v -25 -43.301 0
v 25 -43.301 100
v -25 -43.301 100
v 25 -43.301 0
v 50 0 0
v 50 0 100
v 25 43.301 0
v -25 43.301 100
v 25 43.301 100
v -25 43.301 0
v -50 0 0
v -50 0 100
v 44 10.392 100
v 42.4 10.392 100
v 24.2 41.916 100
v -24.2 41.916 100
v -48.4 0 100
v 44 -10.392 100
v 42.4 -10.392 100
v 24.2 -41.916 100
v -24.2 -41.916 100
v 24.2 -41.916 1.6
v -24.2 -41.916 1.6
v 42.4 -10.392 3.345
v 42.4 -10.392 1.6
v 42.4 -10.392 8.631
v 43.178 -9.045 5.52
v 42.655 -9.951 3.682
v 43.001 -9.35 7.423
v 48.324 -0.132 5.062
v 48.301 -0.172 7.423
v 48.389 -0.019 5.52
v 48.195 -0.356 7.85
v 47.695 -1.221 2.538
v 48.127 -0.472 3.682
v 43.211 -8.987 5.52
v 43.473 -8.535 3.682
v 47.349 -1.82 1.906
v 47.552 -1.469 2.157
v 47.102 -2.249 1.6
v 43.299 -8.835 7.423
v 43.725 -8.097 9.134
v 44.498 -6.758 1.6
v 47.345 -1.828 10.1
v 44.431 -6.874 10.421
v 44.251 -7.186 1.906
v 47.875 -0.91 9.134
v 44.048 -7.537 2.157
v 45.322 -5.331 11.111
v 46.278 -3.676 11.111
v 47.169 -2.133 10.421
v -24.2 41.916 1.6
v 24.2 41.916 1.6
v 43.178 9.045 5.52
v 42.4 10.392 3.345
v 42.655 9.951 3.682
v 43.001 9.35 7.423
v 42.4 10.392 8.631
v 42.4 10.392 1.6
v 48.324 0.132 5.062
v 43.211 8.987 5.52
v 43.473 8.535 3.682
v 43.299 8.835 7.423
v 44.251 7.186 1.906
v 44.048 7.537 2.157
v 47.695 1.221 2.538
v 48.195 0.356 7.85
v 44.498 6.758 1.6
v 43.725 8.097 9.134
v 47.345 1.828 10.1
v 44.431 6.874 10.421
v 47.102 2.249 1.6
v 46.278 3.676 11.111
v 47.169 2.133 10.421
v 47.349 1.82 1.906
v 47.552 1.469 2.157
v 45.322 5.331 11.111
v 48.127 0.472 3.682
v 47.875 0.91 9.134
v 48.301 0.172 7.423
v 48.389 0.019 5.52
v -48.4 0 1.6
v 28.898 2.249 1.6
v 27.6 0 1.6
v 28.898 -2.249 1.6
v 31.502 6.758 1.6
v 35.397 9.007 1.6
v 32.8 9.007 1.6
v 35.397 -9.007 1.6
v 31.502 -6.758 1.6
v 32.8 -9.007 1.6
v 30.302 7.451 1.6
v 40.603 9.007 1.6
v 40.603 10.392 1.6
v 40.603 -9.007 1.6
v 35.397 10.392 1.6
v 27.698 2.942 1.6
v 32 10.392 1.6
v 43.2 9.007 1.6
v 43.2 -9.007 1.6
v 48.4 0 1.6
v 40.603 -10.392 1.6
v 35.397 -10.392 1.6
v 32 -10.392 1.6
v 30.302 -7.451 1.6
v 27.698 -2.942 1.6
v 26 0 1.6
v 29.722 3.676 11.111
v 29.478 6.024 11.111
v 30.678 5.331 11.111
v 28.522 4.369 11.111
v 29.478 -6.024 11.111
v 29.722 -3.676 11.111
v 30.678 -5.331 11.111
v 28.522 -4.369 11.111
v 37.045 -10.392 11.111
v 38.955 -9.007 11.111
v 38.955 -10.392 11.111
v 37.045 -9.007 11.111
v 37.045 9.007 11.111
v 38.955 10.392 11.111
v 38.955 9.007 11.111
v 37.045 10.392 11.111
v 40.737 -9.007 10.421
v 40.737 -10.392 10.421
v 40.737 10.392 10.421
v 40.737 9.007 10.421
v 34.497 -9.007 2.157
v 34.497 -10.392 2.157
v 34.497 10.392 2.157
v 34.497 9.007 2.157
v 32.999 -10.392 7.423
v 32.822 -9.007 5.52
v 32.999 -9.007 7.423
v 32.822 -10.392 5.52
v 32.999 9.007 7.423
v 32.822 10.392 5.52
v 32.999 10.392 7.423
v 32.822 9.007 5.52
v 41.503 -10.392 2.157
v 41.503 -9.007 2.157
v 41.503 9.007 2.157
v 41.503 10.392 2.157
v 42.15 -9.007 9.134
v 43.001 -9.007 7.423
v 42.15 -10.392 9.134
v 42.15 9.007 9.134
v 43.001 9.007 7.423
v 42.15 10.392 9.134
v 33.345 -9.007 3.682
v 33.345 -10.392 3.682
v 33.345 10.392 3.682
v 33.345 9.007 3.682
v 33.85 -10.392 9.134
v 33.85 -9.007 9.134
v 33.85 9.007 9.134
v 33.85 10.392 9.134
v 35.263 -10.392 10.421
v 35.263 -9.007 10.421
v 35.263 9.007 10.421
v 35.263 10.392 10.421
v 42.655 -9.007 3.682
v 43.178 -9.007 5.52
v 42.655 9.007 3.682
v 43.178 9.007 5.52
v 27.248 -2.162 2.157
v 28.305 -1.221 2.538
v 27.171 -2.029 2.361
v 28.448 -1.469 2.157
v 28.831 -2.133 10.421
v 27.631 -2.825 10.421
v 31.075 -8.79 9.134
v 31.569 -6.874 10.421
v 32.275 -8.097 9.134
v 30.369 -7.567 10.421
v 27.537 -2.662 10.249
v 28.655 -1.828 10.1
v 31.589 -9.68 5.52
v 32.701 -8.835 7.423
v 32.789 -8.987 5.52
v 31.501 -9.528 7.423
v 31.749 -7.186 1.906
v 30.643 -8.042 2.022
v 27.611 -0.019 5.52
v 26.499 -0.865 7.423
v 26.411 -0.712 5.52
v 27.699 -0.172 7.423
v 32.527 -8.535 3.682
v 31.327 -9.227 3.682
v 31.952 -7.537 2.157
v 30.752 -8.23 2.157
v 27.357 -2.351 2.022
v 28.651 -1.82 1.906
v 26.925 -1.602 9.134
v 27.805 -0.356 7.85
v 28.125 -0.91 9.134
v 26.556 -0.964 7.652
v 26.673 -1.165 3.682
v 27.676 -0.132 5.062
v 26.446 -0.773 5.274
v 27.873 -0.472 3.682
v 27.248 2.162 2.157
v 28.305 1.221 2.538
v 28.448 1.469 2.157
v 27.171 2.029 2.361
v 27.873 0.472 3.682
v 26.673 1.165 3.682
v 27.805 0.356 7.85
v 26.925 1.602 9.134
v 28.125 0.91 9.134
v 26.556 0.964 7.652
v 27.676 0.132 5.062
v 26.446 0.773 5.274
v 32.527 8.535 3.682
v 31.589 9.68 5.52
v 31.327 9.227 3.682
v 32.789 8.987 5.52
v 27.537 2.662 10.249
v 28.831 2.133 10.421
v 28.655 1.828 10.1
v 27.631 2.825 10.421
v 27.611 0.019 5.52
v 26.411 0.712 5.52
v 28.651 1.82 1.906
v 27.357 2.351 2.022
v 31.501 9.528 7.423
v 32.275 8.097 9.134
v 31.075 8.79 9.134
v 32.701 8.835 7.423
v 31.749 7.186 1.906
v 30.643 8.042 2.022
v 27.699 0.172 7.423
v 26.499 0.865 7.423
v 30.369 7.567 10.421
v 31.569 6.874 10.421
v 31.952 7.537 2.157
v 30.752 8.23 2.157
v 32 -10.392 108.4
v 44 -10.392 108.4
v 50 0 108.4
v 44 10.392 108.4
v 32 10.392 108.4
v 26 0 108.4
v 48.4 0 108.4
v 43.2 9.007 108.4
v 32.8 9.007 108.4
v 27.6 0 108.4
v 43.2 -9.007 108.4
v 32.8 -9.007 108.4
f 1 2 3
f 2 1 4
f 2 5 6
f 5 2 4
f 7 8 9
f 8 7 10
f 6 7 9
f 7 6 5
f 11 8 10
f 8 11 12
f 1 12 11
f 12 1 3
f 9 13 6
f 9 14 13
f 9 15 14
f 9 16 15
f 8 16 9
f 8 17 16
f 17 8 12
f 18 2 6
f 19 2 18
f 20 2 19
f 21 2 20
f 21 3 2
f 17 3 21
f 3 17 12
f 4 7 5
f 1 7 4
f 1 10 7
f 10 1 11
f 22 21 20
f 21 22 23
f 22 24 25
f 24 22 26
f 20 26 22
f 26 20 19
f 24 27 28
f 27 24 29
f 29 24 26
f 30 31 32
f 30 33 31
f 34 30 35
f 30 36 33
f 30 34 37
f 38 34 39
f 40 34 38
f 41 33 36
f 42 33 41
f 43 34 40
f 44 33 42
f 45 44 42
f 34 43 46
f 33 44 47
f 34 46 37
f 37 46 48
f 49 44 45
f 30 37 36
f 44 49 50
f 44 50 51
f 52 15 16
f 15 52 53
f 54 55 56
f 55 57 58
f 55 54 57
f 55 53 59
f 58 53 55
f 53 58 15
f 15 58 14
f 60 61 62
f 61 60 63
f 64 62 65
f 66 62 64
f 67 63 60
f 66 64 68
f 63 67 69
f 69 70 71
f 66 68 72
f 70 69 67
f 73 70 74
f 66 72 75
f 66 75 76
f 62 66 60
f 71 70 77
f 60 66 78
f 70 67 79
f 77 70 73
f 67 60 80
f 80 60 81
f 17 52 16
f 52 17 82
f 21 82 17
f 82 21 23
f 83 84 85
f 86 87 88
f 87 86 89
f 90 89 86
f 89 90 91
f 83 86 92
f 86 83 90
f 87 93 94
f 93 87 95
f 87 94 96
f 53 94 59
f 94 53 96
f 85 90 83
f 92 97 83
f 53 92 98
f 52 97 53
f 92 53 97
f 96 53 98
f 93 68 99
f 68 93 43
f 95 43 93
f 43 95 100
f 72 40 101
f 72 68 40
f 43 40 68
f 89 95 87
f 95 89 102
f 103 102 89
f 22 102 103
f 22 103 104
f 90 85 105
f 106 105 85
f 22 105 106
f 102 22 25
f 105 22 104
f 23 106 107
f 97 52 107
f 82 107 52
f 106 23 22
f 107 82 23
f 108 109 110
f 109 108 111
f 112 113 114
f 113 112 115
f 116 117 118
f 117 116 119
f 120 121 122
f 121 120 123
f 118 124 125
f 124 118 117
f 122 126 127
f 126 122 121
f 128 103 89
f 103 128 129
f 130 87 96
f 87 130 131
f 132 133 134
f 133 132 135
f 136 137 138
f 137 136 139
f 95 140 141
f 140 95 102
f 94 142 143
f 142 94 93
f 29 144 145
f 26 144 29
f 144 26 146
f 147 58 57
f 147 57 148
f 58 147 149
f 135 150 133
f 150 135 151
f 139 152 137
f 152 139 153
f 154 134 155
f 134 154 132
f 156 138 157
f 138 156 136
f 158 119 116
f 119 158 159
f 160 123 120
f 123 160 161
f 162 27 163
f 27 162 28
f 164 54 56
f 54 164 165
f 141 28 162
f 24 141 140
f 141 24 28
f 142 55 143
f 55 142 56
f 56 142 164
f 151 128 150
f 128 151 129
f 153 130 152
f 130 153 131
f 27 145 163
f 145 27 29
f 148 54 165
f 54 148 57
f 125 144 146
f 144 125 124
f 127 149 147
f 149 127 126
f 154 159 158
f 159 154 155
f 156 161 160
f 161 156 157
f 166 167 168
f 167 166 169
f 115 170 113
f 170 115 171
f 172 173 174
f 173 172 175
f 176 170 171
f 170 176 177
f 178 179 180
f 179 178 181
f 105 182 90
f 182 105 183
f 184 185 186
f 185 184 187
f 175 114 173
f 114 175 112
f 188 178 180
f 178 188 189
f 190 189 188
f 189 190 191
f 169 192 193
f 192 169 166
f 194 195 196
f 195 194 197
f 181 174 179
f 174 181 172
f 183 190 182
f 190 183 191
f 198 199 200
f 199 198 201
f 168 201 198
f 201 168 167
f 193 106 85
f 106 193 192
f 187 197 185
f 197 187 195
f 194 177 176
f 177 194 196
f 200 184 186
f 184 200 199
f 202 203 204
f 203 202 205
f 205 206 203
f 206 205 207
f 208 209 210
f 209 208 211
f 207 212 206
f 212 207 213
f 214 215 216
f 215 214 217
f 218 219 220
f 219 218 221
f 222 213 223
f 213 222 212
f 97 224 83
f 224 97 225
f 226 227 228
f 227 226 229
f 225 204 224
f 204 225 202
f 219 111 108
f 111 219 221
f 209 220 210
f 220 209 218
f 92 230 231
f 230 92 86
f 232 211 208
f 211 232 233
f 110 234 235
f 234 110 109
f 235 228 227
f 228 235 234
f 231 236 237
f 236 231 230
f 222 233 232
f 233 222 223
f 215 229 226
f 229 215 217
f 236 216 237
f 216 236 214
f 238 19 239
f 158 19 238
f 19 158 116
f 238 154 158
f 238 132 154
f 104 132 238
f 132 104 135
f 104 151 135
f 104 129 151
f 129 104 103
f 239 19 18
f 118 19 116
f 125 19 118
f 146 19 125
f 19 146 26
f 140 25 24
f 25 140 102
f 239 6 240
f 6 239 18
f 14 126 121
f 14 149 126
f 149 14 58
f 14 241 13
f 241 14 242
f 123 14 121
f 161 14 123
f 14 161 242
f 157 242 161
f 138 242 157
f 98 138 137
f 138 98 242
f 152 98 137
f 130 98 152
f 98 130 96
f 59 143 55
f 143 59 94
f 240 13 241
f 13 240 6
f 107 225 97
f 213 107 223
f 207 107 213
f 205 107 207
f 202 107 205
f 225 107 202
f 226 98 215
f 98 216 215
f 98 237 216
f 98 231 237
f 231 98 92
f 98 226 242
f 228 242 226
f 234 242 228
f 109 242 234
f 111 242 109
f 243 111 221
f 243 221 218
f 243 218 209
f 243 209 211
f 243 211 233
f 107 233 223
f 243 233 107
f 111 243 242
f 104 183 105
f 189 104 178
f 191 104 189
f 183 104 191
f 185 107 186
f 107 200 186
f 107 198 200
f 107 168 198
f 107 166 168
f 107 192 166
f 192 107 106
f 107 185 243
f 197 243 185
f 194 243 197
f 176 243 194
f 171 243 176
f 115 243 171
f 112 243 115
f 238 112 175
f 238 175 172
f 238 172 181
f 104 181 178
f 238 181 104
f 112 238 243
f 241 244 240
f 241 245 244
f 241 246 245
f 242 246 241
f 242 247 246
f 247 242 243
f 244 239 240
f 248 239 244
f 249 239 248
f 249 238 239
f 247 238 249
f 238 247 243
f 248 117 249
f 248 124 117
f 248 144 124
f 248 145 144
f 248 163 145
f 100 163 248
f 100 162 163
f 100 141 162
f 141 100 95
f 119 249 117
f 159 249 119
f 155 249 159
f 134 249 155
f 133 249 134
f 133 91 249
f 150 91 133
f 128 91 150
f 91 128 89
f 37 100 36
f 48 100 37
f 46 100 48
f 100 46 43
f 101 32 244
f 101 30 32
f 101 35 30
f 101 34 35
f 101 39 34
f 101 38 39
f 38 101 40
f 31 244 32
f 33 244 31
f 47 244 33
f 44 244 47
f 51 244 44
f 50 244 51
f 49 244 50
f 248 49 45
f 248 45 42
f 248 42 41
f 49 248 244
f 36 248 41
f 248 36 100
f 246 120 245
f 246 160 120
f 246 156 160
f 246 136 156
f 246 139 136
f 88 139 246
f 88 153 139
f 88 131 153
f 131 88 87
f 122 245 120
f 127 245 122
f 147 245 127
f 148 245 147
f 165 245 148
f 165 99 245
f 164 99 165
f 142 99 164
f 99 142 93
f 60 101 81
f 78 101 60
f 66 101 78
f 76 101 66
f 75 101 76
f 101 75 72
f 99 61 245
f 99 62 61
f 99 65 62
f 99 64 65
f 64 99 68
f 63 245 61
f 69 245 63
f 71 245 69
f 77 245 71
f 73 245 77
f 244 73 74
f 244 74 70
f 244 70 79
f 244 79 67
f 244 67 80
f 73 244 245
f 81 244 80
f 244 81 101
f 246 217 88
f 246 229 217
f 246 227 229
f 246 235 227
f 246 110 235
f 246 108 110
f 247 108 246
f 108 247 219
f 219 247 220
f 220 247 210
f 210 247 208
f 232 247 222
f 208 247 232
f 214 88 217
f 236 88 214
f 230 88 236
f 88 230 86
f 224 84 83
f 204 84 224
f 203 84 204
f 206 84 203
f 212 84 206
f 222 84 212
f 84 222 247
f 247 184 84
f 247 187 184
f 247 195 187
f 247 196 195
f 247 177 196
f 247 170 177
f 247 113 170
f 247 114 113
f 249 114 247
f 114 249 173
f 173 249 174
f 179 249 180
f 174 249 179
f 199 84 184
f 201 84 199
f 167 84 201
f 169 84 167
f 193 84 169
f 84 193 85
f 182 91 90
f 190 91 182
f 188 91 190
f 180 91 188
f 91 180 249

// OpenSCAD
// Self-watering planter
// Joe Wingbermuehle
// 2018-04-19

render_inside = 0;          // Render inside (1) or outside (0).

wall_width = 1.6;           // Width of walls
radius = 50;                // Radius of the pot
filler_radius = 12;         // Radius of the filler hole
hole_radius = 1;            // Radius of the holes in the inner pot
outside_height = 100;       // Height of the outer pot
lip_height = 10;            // Amount the inner pot sticks over the outer pot.
pot_height = 20;            // Depth of the outer pot before it starts bending in
sides = 6;                  // Number of sides (3 or more)
tolerance = 0.8;            // Tolerance between pots

inside_height = outside_height + lip_height - wall_width;
inside_radius = radius - wall_width - tolerance;
bottom_radius = inside_radius / 3;

// Draw the filler (used with the outside part).
module filler() {
    translate([radius - filler_radius, 0, 0]) {
        difference() {
            cylinder(inside_height, filler_radius, filler_radius, $fn = sides);
            translate([0, 0, wall_width]) {
                cylinder(inside_height, filler_radius - wall_width, filler_radius - wall_width, $fn = sides);
            }
            side_length = 2 * filler_radius * sin(180 / sides);
            translate([0, 0, side_length / 2]) {
                rotate([0, 90, 0]) {
                    for(i = [0 : sides - 1]) {
                        rotate([i * 360 / sides + 180 / sides, 0, 0]) {
                            cylinder(filler_radius, side_length / 2 - wall_width / 2, side_length / 2 - wall_width / 2);
                        }
                    }
                }
            }
        }
    }
}

// Draw the outside.
module outside() {
    difference() {
        cylinder(outside_height, radius, radius, $fn = sides);
        translate([0, 0, wall_width]) {
            cylinder(outside_height, radius - wall_width, radius - wall_width, $fn = sides);
        }
    }
    filler();
}

// Draw the shape for the inner pot.
module pot_solid(top_size, bottom_size) {
    // Top part
    translate([0, 0, inside_height - pot_height - wall_width - tolerance]) {
        cylinder(pot_height, top_size, top_size, $fn = sides);
    }
    
    // Bottom part.
    cylinder(inside_height - pot_height, bottom_size, top_size, $fn = sides);
}

// Draw the inner pot.
module inside() {
    difference() {
        union() {
            // The pot outline
            difference() {
                pot_solid(inside_radius, bottom_radius);
                pot_solid(inside_radius - wall_width, bottom_radius - wall_width);
            }
            
            // The bottom.
            cylinder(wall_width, bottom_radius, bottom_radius, $fn = sides);
            
            // Filler border.
            intersection() {
                translate([radius - filler_radius, 0, 0]) {
                    cylinder(
                        inside_height,
                        filler_radius + wall_width + tolerance,
                        filler_radius + wall_width + tolerance,
                        $fn = sides
                    );
                }
                pot_solid(inside_radius, bottom_radius);
            }
        }
        
        // Filler cutout.
        translate([radius - filler_radius, 0, 0]) {
            cylinder(inside_height, filler_radius + tolerance, filler_radius + tolerance, $fn = sides);
        }
        
        // Holes.
        for(z = [0 : 3]) {
            translate([0, 0, wall_width * 2 + z * wall_width * 4]) {
                rotate([0, 90, 0]) {
                    for(i = [0 : sides]) {
                        rotate([i * 360 / sides + 180 / sides, 0, 0]) {
                            cylinder(2 * radius, hole_radius, hole_radius);
                        }
                    }
                }
            }
        }
    }
}

if(render_inside)
    translate([0, 0, wall_width + tolerance]) inside();
else
    outside();
